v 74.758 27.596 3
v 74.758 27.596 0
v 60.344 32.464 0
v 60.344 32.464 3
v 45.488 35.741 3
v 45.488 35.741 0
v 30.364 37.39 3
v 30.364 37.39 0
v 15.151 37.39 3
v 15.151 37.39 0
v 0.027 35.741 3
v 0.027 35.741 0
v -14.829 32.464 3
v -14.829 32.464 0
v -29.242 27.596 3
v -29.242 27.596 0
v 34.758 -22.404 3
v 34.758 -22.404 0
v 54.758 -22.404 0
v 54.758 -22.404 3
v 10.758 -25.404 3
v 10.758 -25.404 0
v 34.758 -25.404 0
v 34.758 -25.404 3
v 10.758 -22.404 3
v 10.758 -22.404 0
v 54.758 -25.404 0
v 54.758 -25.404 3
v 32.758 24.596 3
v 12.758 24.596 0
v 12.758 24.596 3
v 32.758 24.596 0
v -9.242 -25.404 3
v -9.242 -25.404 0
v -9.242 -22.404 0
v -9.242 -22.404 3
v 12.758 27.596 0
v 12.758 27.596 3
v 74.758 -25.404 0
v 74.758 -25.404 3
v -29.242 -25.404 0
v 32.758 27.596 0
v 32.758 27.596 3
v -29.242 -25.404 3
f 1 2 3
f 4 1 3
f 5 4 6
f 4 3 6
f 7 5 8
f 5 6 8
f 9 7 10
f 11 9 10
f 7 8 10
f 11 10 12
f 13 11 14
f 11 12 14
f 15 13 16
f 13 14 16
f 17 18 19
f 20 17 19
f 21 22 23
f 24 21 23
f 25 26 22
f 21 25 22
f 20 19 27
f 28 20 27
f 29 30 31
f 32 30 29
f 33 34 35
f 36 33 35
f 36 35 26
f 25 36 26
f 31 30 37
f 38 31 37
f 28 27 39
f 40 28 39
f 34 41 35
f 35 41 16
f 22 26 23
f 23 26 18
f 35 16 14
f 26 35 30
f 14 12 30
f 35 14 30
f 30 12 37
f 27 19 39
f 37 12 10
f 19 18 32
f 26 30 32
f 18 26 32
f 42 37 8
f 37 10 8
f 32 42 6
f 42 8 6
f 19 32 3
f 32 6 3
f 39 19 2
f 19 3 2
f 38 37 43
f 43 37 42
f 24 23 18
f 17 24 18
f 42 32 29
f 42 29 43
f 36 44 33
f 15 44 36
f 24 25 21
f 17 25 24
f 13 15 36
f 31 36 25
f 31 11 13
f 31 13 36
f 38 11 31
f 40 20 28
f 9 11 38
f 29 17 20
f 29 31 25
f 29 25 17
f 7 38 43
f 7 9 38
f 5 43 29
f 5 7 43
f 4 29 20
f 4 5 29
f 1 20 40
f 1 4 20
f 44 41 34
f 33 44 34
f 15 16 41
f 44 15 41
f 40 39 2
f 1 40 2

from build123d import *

# Parameters (mm, degrees)
SKETCH1_W           = 20
SKETCH1_H           = 3
BOSS_EXTRUDE1_DEPTH = 3


with BuildPart() as part:
    # Sketch1 → Boss-Extrude1 (new body)
    with BuildSketch(Plane.XY):
        with BuildLine():
            Line((-9.242159986, -25.403689193), (-9.242159986, -22.403689193))
            Line((-9.242159986, -22.403689193), (10.757840014, -22.403689193))
            Line((10.757840014, -22.403689193), (10.757840014, -25.403689193))
            Line((10.757840014, -25.403689193), (34.757840014, -25.403689193))
            Line((34.757840014, -25.403689193), (34.757840014, -22.403689193))
            Line((34.757840014, -22.403689193), (54.757840014, -22.403689193))
            Line((54.757840014, -22.403689193), (54.757840014, -25.403689193))
            Line((54.757840014, -25.403689193), (74.757840014, -25.403689193))
            Line((74.757840014, -25.403689193), (74.757840014, 27.596310807))
            ThreePointArc((74.757840014, 27.596310807), (22.757840014, 37.596310807), (-29.242159986, 27.596310807))
            Line((-29.242159986, 27.596310807), (-29.242159986, -25.403689193))
            Line((-29.242159986, -25.403689193), (-9.242159986, -25.403689193))
        make_face()
        with Locations((22.757840014, 26.096310807)):
            Rectangle(SKETCH1_W, SKETCH1_H, mode=Mode.SUBTRACT)
    extrude(amount=BOSS_EXTRUDE1_DEPTH)


solid = part.part
